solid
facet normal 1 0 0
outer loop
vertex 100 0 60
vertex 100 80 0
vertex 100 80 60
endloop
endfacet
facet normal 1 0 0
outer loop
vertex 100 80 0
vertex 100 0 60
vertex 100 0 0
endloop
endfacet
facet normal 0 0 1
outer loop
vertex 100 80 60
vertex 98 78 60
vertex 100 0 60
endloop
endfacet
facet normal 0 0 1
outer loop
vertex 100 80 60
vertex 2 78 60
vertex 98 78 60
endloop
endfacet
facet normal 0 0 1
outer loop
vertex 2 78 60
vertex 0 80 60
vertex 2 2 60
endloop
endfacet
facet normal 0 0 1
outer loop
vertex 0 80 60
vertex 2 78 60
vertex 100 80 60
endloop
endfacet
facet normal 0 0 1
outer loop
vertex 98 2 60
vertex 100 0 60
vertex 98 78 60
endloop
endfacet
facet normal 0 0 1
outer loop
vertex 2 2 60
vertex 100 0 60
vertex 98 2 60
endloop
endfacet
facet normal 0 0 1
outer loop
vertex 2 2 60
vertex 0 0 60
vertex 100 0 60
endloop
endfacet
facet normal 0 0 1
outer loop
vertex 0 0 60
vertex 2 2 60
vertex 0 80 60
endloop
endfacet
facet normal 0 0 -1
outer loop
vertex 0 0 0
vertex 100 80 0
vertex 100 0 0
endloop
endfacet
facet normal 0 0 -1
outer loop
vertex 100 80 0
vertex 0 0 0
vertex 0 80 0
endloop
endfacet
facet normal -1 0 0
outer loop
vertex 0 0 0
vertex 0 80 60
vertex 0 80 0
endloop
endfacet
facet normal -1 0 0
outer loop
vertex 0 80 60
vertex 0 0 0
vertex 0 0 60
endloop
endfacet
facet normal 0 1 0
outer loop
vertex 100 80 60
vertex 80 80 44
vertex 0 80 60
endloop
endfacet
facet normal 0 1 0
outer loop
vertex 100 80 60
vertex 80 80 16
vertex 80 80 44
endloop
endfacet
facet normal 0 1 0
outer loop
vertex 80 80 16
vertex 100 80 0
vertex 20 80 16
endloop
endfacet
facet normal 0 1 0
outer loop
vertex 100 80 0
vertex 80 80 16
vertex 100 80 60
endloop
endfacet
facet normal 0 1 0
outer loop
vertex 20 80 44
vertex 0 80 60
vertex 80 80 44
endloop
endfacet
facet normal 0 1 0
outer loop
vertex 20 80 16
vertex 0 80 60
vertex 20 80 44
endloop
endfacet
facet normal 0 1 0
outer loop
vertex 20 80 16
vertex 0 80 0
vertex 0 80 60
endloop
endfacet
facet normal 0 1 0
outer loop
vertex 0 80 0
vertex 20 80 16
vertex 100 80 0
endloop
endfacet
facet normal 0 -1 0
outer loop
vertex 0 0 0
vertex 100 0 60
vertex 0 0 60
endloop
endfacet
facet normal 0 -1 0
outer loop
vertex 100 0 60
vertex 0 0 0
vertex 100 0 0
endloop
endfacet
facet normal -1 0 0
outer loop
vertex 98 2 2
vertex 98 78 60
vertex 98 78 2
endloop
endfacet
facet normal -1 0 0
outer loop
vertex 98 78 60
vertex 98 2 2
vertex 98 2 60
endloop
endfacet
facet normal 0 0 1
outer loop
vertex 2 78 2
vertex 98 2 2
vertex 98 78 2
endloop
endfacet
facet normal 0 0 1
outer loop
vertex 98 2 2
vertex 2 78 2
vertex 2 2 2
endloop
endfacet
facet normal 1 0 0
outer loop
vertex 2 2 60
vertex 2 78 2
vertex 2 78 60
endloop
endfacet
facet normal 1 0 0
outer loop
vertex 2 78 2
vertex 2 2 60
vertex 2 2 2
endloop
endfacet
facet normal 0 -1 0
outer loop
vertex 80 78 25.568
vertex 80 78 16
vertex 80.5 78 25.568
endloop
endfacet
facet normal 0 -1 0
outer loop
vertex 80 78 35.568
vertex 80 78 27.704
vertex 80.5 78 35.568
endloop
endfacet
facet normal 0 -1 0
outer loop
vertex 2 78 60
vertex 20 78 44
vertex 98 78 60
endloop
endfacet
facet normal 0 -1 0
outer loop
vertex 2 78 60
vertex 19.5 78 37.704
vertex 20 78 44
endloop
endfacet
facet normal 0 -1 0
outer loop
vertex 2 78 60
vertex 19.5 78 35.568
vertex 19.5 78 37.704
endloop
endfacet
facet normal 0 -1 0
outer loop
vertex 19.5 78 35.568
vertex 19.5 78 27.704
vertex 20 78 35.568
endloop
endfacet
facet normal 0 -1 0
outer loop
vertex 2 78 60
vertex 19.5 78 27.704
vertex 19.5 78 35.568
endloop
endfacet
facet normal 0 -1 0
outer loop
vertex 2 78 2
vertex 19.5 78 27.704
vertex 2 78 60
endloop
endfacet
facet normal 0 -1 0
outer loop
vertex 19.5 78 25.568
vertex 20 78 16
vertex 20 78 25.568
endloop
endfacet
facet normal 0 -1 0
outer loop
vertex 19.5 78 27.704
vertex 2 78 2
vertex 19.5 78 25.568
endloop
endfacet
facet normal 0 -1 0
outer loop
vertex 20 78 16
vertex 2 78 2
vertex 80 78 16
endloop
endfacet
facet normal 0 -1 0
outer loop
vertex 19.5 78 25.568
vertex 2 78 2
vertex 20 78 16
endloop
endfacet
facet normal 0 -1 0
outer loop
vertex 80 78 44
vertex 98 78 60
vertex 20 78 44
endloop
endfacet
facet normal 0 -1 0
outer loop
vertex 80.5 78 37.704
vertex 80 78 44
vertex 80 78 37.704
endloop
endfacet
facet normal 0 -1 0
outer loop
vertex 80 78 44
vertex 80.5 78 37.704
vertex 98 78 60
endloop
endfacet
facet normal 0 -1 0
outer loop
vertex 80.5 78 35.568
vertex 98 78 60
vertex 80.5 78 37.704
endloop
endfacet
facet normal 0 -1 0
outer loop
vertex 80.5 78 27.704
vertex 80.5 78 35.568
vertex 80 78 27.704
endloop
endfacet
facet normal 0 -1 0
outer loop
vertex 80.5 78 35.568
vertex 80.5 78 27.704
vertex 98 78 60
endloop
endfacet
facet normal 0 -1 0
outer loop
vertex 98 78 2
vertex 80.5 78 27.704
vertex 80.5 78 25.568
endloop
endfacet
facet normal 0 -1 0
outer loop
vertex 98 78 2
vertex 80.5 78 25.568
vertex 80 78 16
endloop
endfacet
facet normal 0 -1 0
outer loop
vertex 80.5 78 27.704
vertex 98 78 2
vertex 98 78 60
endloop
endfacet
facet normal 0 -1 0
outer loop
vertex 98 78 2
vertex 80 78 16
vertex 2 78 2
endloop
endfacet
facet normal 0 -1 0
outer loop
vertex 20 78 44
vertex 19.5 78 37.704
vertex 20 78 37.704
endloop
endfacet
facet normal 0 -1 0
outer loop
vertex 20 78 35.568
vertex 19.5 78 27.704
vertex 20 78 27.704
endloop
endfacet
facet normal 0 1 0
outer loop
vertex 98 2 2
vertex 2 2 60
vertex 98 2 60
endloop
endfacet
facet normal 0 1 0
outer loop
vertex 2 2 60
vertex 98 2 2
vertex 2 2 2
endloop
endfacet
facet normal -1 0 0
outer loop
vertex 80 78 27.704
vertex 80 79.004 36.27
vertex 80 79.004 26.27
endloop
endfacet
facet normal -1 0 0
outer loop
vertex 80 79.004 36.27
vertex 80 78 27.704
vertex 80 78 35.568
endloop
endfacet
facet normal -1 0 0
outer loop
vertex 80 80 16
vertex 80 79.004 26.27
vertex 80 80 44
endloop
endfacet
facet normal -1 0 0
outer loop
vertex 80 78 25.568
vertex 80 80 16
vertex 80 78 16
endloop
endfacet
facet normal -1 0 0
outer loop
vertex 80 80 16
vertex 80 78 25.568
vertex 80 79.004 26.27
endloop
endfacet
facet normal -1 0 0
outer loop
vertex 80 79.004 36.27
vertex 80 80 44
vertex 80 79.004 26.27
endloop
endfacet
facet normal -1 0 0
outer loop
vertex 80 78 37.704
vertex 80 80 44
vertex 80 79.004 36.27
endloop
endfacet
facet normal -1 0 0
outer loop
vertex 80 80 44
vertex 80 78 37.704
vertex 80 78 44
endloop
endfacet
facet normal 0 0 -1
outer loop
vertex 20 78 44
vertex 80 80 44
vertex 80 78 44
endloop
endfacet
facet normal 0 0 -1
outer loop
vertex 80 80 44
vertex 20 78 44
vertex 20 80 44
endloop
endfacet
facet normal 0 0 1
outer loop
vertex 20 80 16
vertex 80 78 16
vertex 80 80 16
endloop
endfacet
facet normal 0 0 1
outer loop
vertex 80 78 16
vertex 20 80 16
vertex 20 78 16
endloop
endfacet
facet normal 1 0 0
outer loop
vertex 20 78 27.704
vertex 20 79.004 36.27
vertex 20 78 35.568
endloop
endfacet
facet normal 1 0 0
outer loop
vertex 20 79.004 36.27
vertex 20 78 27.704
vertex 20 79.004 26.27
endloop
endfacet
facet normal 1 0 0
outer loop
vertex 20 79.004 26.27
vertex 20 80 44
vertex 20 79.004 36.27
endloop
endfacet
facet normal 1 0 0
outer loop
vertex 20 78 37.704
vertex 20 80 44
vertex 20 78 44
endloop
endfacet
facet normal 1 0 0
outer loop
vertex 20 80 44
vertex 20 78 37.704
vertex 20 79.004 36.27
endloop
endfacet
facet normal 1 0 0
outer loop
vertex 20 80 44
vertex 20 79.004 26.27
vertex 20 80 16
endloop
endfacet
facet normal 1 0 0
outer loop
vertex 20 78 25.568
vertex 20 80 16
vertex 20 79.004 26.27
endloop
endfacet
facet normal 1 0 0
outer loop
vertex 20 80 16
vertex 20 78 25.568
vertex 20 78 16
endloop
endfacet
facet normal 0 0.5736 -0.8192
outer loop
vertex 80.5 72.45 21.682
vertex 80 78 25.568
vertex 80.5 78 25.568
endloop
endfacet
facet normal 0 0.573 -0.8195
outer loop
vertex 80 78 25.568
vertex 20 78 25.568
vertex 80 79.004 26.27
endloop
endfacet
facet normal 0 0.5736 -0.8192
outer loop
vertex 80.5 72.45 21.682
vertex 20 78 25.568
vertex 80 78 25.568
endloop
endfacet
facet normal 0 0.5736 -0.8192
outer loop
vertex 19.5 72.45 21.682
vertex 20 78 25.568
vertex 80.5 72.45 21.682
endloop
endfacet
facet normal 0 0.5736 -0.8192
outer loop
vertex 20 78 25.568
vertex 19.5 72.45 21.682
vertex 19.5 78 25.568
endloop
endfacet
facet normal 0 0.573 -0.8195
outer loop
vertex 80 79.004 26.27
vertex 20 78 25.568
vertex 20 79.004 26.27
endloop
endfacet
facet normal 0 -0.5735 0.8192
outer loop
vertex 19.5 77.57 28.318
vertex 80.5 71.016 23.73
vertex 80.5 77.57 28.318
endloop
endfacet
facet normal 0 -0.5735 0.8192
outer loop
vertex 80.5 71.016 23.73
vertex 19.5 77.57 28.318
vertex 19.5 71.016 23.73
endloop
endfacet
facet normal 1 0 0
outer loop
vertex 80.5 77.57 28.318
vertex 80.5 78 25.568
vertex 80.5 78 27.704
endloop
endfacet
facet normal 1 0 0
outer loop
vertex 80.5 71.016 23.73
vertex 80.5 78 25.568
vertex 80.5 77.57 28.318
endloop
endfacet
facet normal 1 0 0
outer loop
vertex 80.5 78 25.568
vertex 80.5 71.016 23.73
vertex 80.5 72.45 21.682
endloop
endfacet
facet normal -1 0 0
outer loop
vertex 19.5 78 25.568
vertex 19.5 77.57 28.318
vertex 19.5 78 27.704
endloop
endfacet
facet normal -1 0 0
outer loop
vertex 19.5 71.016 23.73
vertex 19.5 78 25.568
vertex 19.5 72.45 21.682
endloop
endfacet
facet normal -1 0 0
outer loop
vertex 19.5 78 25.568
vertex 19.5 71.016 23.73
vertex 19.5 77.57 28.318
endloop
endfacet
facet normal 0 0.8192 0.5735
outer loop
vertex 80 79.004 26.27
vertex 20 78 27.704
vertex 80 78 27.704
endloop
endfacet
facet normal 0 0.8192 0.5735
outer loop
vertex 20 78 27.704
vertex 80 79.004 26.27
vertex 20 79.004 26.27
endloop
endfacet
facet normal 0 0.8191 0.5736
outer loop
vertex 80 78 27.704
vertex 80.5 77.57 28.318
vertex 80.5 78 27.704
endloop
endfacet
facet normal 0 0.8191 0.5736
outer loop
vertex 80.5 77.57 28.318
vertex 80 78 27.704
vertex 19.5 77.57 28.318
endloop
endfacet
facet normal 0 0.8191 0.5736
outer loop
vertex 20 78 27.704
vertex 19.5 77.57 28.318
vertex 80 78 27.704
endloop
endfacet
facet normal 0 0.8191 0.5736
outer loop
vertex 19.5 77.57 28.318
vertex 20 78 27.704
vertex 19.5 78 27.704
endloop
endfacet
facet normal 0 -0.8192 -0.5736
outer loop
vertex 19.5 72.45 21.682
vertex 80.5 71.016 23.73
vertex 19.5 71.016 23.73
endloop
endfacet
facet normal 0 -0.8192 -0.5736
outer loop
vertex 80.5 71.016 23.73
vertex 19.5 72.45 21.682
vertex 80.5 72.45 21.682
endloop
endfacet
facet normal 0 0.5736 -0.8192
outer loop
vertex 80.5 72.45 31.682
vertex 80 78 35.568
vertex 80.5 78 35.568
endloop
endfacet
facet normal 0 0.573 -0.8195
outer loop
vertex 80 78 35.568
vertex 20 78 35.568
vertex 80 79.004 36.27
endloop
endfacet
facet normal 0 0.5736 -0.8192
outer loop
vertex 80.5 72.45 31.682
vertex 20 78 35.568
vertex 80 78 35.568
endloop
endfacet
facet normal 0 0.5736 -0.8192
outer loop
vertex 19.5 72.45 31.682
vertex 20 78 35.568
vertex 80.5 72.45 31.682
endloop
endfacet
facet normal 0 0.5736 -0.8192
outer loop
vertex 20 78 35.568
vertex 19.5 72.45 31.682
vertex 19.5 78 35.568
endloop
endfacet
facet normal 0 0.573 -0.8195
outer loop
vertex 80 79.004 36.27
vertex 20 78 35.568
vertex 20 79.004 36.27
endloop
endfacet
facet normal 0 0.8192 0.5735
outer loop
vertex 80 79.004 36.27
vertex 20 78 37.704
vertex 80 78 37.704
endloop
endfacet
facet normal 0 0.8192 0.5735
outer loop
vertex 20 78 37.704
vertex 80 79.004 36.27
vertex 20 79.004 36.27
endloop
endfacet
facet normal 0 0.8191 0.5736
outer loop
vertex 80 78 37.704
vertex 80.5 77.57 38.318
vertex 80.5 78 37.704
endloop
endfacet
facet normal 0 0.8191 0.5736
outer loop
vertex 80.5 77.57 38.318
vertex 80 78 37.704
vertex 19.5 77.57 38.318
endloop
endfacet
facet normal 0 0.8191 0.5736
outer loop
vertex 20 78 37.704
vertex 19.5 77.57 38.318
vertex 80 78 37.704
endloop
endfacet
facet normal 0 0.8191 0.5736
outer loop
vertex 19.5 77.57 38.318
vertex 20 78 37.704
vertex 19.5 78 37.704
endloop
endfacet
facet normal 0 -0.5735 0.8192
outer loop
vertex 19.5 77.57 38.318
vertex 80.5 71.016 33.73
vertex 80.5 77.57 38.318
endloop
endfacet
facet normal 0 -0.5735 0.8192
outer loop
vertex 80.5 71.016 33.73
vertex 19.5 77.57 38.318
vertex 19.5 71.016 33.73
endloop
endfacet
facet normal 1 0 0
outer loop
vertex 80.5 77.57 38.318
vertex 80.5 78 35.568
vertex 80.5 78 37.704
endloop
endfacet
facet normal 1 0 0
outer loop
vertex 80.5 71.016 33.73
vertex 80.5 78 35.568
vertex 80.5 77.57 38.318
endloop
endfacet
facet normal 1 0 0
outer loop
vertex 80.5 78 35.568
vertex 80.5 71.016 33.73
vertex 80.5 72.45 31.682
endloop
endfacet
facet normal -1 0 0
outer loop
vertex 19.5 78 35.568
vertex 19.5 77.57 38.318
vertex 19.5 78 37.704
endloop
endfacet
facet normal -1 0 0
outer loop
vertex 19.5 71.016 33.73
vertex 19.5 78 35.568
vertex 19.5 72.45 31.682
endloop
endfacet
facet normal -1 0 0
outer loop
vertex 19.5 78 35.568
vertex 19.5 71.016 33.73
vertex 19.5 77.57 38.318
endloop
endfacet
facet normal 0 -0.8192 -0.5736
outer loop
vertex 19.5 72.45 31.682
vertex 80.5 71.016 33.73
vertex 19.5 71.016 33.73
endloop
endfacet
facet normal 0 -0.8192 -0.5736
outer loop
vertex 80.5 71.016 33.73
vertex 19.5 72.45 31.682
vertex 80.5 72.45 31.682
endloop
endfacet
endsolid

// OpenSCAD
$fn = 32;

// ----------------------------------------------------------------------
// Vent box: louvers enclosure
// ----------------------------------------------------------------------

// --- parameters (mm) ---
box_l = 100;              // box length, X
box_w = 80;               // box width, Y
box_h = 60;               // box height, Z
wall_t = 2;               // shell wall thickness
win_l = 60;               // vent window width, X
win_h = 28;               // vent window height, Z
slat_t = 2.5;             // louver slat thickness
slat_d = 8;               // louver slat depth
slat_a = 35;              // louver slat angle, degrees
slat_pitch = 10;          // louver pitch
slat_yc = 75.01;          // slat centreline Y

win_z0 = (box_h - win_h) / 2;  // window lower edge Z
n_slats = 2;  // louver count
slat_z0 = win_z0 + (win_h - (n_slats - 1) * slat_pitch) / 2;

difference() {
  union() {
    difference() {
      cube([box_l, box_w, box_h]);
  translate([wall_t, wall_t, wall_t])
    cube([box_l - 2 * wall_t, box_w - 2 * wall_t, box_h]);
  translate([(box_l - win_l) / 2, box_w - wall_t - 1, win_z0])
    cube([win_l, wall_t + 2, win_h]);
    }
    for (i = [0 : n_slats - 1])
      translate([box_l / 2, slat_yc, slat_z0 + i * slat_pitch])
        rotate([slat_a, 0, 0])
          cube([win_l + 1, slat_d, slat_t], center = true);
  }
}
